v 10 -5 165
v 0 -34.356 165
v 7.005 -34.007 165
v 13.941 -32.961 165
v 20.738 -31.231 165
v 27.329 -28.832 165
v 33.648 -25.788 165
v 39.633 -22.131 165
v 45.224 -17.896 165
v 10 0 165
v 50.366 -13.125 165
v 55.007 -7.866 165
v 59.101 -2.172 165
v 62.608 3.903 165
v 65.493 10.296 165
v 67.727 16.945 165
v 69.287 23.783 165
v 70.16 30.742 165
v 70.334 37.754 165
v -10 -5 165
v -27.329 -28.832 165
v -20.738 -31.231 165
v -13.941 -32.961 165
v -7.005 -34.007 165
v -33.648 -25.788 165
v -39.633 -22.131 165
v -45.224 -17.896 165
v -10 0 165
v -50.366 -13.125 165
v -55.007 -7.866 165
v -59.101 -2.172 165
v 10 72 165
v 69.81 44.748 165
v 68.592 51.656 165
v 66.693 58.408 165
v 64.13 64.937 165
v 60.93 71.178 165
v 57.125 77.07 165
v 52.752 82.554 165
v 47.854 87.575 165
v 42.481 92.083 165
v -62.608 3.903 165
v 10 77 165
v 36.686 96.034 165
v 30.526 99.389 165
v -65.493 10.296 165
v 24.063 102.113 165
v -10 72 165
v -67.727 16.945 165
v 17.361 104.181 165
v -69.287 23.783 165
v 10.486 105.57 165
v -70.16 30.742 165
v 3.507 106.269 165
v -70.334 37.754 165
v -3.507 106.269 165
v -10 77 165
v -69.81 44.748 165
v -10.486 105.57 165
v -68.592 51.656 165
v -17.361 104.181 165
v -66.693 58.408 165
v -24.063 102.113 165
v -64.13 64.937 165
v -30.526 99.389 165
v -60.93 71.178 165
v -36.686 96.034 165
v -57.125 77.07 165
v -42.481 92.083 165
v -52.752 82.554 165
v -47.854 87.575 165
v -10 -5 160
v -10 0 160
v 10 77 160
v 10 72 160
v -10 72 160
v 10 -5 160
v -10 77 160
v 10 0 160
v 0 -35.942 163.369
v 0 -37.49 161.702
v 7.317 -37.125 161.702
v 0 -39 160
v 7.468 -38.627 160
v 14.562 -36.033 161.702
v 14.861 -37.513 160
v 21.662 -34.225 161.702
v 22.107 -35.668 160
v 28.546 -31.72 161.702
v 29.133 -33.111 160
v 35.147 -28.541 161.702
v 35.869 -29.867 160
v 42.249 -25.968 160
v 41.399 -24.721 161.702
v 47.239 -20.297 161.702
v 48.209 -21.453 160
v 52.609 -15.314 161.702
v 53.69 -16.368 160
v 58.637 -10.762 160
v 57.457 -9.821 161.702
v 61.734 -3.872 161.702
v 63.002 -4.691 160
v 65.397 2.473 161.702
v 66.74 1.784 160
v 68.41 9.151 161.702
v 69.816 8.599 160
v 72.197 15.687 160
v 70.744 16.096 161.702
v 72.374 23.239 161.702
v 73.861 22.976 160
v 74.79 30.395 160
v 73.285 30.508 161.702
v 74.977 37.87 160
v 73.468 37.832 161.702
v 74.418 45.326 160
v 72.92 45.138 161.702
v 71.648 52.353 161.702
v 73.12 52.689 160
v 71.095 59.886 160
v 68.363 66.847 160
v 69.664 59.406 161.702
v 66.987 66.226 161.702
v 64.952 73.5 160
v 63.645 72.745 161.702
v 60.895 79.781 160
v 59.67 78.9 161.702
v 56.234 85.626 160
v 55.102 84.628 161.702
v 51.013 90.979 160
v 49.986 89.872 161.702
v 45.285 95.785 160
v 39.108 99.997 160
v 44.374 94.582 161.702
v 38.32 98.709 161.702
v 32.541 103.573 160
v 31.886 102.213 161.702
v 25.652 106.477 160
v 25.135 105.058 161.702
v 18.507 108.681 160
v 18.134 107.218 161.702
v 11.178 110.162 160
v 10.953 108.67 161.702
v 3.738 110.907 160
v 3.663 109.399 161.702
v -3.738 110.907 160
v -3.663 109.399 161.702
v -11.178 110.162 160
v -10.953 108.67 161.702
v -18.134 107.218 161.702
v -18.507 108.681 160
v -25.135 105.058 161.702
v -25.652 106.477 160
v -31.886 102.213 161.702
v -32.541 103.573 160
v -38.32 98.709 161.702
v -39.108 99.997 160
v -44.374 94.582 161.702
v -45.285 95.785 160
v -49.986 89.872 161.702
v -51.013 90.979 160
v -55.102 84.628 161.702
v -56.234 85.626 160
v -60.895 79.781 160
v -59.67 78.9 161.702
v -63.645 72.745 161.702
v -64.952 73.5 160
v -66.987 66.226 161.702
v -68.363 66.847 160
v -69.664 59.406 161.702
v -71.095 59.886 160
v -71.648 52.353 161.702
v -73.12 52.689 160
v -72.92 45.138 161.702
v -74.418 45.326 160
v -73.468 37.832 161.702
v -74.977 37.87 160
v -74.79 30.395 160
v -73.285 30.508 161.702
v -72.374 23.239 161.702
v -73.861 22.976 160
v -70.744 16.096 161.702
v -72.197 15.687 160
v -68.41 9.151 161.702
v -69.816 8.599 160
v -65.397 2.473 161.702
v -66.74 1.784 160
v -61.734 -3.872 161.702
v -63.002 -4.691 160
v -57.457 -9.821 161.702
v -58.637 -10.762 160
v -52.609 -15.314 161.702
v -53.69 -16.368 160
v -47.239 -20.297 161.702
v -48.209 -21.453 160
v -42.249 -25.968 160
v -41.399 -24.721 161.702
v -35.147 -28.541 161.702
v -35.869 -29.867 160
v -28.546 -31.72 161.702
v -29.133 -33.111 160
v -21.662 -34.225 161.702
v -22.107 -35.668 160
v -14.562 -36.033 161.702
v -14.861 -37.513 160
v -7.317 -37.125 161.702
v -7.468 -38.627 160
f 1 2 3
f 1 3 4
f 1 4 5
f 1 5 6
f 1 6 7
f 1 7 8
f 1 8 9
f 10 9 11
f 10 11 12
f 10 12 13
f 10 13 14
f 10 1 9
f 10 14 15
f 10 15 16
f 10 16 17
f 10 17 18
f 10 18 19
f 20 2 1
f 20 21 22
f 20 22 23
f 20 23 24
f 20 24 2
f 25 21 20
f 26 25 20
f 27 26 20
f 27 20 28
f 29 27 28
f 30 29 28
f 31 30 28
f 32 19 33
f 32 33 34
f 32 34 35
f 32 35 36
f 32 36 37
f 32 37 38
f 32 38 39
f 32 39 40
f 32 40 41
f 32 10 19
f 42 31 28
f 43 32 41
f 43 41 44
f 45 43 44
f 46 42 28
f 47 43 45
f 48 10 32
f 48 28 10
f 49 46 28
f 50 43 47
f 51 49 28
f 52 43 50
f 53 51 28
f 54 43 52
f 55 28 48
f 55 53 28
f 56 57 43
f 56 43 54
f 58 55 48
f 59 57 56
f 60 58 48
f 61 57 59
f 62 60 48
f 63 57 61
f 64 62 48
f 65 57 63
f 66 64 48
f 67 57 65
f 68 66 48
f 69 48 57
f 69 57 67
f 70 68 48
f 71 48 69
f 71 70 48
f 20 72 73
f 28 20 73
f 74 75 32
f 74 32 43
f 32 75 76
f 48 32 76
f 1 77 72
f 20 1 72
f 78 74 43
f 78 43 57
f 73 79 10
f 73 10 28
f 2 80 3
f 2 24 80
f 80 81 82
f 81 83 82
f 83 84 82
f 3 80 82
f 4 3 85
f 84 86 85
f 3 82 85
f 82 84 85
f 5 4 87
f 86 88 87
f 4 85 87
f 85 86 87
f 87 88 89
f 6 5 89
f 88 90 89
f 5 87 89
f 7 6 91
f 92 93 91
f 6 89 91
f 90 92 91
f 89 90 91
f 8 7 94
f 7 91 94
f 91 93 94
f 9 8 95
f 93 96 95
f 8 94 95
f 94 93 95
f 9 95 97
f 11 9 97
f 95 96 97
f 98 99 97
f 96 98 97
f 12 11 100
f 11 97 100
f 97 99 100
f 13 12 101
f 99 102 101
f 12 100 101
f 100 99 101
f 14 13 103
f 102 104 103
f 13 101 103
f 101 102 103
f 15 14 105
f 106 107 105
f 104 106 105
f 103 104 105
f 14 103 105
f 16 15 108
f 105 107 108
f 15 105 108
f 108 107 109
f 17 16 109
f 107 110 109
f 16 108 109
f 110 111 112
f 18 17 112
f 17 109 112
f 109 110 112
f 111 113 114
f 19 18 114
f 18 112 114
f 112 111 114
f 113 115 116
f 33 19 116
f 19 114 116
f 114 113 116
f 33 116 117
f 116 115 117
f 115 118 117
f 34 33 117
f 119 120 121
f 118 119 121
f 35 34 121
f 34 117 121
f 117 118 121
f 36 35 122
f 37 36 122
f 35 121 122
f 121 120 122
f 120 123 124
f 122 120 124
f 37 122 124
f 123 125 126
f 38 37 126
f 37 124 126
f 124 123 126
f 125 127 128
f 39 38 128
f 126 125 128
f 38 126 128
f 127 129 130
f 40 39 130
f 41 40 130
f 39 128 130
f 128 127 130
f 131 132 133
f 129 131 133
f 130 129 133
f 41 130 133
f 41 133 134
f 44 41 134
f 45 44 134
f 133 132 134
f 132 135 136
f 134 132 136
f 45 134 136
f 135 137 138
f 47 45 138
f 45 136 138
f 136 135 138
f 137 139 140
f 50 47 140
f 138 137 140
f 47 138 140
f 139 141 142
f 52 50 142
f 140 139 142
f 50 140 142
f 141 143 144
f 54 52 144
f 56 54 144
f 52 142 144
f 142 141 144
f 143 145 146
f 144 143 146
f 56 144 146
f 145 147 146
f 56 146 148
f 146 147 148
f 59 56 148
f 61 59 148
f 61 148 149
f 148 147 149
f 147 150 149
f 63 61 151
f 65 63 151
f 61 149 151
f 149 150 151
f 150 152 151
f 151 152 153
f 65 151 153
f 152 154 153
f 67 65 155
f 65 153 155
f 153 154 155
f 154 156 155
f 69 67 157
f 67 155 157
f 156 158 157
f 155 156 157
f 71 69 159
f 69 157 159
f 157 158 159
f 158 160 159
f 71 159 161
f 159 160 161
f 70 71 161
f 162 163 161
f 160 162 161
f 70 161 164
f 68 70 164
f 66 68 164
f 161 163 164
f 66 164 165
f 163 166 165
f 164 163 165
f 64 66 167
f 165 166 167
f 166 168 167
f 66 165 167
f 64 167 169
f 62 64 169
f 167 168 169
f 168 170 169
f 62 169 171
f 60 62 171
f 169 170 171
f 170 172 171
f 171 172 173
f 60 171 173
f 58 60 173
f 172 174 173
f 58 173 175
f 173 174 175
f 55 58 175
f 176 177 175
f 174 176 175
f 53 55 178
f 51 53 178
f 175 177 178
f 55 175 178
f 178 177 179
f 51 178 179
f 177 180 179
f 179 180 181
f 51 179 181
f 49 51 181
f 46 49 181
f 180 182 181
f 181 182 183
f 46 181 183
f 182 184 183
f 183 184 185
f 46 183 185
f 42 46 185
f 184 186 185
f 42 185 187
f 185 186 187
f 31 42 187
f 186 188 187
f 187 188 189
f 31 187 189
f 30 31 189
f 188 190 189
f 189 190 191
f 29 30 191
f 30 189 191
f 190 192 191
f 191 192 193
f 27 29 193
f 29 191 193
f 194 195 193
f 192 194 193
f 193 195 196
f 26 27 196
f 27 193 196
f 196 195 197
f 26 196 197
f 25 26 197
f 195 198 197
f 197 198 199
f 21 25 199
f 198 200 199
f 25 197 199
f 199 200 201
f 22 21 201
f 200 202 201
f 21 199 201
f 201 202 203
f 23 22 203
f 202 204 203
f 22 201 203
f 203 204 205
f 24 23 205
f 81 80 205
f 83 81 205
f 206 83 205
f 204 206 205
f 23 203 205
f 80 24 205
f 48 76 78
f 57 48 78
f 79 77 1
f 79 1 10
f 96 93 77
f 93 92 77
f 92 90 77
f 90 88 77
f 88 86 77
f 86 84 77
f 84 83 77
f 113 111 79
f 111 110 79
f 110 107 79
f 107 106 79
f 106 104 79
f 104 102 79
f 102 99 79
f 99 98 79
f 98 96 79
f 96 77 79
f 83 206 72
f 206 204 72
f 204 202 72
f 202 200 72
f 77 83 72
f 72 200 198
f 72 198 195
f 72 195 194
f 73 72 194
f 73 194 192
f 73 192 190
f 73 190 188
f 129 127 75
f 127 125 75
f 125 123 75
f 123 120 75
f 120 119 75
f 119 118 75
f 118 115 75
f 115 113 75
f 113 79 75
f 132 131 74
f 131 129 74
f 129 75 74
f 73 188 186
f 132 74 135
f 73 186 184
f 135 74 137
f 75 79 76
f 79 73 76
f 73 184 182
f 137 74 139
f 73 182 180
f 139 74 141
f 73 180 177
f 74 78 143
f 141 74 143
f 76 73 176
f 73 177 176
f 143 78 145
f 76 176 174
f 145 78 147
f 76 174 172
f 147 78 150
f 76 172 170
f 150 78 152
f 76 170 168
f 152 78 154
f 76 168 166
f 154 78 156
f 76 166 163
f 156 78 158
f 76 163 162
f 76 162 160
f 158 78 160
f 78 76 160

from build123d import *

# Parameters (mm, degrees)
SKETCH018_R         = 75
SKETCH018_W         = 5
SKETCH018_H         = 20
PAD018_DEPTH        = 5
CUT_PLACEMENT_ANGLE = 90


with BuildPart() as revolution:
    # Sketch019 → Revolution (revolve)
    with BuildSketch(Plane.XZ):
        with BuildLine():
            Line((-75, 0), (-75, 5))
            Line((-75, 5), (-70.356236, 5))
            ThreePointArc((-70.356236, 5), (-72.721103, 2.539923), (-75, 0))
        make_face()
    revolve(axis=Axis((0, 0, 0), (0, 0, 1)))


with BuildPart() as bowlsupport:
    # Sketch018 → Pad018 (new body)
    with BuildSketch(Plane.XY):
        Circle(SKETCH018_R)
        with Locations((-38.5, 0)):
            Rectangle(SKETCH018_W, SKETCH018_H, mode=Mode.SUBTRACT)
        with Locations((38.5, 0)):
            Rectangle(SKETCH018_W, SKETCH018_H, mode=Mode.SUBTRACT)
    extrude(amount=PAD018_DEPTH)

    # Cut: cut Revolution
    add(revolution.part, mode=Mode.SUBTRACT)


with BuildPart() as bowlsupport_1:
    # Cut placement: moved
    add(bowlsupport.part.moved(Location((0, 36, 160))).rotate(Axis((0, 36, 160), (0, 0, 1)), CUT_PLACEMENT_ANGLE))


solid = bowlsupport_1.part
